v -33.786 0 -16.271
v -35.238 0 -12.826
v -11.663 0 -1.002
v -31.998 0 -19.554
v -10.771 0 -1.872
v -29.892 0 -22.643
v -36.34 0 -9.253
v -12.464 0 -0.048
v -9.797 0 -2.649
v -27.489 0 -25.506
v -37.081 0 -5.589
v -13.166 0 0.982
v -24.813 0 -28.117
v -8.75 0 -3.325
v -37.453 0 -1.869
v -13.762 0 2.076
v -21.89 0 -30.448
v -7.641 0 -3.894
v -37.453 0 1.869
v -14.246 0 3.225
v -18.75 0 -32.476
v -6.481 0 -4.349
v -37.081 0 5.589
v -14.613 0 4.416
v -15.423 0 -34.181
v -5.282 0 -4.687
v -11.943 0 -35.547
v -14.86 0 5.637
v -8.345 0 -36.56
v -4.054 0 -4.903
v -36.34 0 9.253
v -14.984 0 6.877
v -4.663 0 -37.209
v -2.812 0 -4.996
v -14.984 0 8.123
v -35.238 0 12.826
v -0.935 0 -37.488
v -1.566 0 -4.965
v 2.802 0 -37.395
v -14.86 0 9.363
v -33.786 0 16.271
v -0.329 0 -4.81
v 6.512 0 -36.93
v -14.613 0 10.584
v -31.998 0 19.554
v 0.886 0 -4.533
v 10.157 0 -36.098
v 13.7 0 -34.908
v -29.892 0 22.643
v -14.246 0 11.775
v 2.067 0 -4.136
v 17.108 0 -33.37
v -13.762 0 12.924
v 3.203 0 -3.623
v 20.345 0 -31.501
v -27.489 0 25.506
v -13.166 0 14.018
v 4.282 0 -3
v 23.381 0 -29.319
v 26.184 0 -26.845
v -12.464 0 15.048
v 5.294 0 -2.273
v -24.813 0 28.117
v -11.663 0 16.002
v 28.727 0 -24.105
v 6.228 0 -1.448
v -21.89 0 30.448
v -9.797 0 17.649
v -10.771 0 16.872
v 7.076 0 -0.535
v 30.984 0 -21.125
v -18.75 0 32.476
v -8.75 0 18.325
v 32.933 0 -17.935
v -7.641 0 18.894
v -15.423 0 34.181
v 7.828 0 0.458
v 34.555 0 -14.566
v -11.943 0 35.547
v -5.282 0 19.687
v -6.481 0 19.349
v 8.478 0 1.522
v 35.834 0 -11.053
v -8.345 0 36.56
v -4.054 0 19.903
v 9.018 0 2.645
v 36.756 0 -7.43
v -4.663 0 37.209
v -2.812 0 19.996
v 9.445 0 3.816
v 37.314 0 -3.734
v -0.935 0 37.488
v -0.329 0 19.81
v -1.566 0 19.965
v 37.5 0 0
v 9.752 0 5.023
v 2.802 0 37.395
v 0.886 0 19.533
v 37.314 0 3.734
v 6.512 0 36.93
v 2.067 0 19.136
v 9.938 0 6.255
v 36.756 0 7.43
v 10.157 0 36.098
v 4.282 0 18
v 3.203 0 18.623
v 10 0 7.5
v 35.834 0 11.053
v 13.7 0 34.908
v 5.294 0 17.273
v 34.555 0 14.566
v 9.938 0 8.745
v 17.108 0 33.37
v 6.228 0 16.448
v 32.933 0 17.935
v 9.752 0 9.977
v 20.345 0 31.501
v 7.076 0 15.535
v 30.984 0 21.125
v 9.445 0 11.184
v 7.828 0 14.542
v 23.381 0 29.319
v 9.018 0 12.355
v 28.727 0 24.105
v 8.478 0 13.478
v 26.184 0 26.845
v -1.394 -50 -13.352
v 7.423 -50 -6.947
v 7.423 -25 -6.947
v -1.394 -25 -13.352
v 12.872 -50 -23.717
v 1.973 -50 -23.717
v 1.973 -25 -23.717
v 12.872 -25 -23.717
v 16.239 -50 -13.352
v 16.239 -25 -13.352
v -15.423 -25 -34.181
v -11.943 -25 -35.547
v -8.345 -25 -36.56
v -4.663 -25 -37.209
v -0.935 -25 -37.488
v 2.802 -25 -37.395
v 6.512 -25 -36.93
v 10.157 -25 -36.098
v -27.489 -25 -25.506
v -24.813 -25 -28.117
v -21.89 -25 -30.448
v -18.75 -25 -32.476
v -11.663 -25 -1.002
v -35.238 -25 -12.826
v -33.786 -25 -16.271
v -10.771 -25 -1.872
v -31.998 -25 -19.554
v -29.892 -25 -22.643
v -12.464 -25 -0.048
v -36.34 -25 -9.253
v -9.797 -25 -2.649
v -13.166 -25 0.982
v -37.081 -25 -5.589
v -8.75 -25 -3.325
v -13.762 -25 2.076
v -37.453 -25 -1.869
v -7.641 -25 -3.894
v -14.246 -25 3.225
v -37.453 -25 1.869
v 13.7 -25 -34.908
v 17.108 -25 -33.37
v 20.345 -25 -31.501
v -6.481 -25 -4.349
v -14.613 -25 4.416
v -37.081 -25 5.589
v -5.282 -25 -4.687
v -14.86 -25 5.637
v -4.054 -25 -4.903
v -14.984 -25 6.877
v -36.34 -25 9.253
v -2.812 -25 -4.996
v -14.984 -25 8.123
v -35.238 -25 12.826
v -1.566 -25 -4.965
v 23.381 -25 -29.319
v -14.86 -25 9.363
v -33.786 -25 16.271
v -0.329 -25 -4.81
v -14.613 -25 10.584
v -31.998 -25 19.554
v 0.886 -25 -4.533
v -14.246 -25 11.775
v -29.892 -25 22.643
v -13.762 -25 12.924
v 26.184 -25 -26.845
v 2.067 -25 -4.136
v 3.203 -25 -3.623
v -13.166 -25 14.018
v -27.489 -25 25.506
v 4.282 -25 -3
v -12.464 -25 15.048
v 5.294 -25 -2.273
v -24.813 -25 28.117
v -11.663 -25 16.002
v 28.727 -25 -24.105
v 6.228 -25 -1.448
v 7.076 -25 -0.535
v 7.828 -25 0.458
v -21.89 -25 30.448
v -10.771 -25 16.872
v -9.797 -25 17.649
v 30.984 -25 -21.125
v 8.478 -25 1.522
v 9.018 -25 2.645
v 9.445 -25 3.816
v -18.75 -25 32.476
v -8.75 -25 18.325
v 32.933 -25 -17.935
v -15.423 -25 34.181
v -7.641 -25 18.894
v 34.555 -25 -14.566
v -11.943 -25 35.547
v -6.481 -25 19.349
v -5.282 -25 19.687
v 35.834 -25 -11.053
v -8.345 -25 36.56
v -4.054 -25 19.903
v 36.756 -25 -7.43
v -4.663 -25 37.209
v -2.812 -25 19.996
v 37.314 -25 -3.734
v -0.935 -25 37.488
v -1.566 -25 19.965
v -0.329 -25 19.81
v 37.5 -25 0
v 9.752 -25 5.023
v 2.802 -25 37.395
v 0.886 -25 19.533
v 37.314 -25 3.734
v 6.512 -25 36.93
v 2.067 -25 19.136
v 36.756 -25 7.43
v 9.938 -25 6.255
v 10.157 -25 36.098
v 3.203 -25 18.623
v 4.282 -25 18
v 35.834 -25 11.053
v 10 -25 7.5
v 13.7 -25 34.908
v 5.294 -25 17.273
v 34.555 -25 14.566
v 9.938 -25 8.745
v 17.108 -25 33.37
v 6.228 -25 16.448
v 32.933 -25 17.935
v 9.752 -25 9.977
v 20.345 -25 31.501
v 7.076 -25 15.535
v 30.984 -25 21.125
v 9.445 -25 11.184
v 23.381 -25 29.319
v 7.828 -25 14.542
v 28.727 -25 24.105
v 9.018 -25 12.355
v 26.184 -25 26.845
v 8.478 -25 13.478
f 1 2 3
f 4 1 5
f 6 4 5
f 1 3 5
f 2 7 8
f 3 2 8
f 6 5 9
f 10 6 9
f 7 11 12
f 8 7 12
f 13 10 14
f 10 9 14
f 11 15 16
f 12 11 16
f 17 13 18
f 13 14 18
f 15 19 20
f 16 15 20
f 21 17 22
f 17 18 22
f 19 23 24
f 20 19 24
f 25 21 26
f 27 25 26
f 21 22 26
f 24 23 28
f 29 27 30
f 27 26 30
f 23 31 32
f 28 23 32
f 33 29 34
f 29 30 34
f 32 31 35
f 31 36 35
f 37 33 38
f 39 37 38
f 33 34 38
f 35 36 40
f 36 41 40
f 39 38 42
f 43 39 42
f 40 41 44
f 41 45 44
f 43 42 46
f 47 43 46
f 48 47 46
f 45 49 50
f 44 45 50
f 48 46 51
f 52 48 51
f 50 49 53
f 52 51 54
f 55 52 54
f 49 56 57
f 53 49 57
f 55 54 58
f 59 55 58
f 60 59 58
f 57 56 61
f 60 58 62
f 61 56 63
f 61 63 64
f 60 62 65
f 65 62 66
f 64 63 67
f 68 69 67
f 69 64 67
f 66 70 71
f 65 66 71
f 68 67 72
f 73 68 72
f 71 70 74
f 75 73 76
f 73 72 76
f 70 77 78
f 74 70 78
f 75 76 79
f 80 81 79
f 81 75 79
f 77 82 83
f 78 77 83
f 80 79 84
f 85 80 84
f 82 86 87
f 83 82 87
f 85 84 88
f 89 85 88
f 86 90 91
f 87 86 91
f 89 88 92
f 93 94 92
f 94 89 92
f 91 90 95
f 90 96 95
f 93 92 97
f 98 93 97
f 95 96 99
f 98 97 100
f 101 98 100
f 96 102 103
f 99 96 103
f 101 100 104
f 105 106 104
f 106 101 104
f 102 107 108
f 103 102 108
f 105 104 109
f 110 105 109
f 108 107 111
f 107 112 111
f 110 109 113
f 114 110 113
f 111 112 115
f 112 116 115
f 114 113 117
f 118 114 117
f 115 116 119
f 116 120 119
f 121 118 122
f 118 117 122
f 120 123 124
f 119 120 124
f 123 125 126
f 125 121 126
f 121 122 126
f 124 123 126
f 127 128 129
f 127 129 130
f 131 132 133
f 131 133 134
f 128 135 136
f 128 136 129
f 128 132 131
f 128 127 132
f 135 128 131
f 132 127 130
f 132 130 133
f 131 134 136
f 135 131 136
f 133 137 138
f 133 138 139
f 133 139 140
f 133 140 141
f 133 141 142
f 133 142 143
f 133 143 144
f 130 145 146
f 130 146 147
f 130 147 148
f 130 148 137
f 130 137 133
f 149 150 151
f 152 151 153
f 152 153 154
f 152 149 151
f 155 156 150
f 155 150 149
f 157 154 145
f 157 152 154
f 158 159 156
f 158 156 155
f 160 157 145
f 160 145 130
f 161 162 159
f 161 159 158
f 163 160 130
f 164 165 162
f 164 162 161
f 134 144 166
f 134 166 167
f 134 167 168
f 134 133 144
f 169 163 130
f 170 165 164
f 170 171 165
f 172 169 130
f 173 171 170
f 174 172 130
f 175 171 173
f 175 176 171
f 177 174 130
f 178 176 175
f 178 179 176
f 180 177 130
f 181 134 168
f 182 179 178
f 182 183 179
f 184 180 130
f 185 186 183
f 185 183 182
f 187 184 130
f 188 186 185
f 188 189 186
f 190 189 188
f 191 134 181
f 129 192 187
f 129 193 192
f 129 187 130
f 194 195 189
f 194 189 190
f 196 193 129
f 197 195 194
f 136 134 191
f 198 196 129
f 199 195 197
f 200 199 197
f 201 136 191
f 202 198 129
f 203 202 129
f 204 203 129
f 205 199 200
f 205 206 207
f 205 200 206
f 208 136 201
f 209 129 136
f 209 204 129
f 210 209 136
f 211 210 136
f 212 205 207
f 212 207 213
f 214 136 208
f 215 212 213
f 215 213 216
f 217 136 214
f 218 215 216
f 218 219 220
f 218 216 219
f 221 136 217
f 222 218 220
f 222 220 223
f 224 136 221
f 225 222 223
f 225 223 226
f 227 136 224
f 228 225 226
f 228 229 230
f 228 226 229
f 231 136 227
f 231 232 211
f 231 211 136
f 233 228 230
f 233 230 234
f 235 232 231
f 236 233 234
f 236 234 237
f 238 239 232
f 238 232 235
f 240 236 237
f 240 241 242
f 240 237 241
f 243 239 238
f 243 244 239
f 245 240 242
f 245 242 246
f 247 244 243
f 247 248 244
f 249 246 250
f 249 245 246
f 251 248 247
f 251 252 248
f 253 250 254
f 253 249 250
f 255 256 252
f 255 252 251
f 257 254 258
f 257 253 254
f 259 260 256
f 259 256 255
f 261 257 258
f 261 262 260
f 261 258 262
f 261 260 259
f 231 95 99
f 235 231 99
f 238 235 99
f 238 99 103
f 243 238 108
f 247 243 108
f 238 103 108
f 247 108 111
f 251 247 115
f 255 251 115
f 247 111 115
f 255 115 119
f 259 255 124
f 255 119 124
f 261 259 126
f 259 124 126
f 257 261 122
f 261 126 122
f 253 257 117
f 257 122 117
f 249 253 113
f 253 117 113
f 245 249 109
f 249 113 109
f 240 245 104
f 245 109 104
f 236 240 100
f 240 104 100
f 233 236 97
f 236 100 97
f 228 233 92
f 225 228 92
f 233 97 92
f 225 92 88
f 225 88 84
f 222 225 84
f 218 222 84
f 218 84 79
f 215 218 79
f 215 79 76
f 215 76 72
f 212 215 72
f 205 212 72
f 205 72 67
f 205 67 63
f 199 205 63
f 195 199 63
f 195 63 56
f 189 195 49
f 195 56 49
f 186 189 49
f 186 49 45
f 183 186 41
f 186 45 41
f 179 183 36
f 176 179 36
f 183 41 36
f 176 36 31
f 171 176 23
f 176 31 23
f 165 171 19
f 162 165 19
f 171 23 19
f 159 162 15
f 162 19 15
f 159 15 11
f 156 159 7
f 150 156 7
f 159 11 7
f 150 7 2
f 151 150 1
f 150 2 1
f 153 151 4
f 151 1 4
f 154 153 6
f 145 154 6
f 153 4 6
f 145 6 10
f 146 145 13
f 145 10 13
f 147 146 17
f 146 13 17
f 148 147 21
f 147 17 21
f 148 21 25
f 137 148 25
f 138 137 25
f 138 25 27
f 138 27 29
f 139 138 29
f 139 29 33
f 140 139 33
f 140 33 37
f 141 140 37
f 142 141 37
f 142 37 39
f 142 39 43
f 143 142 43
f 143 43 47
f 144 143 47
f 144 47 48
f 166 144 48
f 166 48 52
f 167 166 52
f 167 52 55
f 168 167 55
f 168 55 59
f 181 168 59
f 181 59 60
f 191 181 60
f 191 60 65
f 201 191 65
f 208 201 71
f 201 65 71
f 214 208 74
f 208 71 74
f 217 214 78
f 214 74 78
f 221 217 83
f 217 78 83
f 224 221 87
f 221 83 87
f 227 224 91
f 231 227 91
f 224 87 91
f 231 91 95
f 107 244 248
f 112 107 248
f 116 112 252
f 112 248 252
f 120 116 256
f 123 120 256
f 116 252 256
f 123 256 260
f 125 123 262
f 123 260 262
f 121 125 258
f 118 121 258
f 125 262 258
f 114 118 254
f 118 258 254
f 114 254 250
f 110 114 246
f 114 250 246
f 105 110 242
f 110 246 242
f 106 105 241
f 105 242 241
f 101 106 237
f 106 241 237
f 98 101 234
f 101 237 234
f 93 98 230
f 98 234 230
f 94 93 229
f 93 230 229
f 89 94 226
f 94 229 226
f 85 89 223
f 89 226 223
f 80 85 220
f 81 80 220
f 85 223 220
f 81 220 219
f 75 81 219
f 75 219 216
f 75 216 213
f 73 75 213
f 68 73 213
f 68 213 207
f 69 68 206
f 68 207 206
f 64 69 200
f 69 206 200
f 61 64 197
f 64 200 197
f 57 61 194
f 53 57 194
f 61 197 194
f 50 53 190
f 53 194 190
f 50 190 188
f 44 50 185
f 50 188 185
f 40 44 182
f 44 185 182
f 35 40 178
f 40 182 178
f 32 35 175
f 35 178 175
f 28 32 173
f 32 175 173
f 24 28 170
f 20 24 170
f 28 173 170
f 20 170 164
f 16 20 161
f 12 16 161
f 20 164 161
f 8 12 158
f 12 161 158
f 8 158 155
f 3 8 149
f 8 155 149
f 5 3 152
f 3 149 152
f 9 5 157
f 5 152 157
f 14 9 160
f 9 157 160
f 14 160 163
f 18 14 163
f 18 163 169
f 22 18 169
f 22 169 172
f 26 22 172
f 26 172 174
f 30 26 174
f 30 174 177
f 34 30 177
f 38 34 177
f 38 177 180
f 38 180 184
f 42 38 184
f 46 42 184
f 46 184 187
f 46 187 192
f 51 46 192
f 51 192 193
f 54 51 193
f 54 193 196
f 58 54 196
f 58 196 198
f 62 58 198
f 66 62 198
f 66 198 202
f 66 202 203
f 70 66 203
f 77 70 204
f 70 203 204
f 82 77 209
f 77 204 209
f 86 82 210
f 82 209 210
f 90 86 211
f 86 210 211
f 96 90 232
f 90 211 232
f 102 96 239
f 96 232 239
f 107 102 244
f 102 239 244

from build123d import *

# Parameters (mm, degrees)
F0_R     = 37.5
F1_DEPTH = 25
F4_R     = 12.5
F5_DEPTH = 25
F7_DEPTH = 25


with BuildPart() as f1:
    # F0 (on Front) → F1 (new body)
    with BuildSketch(Plane.XZ):
        Circle(F0_R)
    extrude(amount=F1_DEPTH)

    # F4 (on face) → F5 (cut)
    with BuildSketch(Plane.XZ.offset(25)):
        with Locations((-2.5, 7.5)):
            Circle(F4_R)
    extrude(amount=-F5_DEPTH, mode=Mode.SUBTRACT)

    # F6 (on face) → F7 (join)
    with BuildSketch(Plane.XZ.offset(25)):
        Polygon((1.973449, -23.717072), (12.871587, -23.717072), (16.239297, -13.352327), (7.422518, -6.946562), (-1.394261, -13.352327), align=None)
    extrude(amount=F7_DEPTH)


solid = f1.part
